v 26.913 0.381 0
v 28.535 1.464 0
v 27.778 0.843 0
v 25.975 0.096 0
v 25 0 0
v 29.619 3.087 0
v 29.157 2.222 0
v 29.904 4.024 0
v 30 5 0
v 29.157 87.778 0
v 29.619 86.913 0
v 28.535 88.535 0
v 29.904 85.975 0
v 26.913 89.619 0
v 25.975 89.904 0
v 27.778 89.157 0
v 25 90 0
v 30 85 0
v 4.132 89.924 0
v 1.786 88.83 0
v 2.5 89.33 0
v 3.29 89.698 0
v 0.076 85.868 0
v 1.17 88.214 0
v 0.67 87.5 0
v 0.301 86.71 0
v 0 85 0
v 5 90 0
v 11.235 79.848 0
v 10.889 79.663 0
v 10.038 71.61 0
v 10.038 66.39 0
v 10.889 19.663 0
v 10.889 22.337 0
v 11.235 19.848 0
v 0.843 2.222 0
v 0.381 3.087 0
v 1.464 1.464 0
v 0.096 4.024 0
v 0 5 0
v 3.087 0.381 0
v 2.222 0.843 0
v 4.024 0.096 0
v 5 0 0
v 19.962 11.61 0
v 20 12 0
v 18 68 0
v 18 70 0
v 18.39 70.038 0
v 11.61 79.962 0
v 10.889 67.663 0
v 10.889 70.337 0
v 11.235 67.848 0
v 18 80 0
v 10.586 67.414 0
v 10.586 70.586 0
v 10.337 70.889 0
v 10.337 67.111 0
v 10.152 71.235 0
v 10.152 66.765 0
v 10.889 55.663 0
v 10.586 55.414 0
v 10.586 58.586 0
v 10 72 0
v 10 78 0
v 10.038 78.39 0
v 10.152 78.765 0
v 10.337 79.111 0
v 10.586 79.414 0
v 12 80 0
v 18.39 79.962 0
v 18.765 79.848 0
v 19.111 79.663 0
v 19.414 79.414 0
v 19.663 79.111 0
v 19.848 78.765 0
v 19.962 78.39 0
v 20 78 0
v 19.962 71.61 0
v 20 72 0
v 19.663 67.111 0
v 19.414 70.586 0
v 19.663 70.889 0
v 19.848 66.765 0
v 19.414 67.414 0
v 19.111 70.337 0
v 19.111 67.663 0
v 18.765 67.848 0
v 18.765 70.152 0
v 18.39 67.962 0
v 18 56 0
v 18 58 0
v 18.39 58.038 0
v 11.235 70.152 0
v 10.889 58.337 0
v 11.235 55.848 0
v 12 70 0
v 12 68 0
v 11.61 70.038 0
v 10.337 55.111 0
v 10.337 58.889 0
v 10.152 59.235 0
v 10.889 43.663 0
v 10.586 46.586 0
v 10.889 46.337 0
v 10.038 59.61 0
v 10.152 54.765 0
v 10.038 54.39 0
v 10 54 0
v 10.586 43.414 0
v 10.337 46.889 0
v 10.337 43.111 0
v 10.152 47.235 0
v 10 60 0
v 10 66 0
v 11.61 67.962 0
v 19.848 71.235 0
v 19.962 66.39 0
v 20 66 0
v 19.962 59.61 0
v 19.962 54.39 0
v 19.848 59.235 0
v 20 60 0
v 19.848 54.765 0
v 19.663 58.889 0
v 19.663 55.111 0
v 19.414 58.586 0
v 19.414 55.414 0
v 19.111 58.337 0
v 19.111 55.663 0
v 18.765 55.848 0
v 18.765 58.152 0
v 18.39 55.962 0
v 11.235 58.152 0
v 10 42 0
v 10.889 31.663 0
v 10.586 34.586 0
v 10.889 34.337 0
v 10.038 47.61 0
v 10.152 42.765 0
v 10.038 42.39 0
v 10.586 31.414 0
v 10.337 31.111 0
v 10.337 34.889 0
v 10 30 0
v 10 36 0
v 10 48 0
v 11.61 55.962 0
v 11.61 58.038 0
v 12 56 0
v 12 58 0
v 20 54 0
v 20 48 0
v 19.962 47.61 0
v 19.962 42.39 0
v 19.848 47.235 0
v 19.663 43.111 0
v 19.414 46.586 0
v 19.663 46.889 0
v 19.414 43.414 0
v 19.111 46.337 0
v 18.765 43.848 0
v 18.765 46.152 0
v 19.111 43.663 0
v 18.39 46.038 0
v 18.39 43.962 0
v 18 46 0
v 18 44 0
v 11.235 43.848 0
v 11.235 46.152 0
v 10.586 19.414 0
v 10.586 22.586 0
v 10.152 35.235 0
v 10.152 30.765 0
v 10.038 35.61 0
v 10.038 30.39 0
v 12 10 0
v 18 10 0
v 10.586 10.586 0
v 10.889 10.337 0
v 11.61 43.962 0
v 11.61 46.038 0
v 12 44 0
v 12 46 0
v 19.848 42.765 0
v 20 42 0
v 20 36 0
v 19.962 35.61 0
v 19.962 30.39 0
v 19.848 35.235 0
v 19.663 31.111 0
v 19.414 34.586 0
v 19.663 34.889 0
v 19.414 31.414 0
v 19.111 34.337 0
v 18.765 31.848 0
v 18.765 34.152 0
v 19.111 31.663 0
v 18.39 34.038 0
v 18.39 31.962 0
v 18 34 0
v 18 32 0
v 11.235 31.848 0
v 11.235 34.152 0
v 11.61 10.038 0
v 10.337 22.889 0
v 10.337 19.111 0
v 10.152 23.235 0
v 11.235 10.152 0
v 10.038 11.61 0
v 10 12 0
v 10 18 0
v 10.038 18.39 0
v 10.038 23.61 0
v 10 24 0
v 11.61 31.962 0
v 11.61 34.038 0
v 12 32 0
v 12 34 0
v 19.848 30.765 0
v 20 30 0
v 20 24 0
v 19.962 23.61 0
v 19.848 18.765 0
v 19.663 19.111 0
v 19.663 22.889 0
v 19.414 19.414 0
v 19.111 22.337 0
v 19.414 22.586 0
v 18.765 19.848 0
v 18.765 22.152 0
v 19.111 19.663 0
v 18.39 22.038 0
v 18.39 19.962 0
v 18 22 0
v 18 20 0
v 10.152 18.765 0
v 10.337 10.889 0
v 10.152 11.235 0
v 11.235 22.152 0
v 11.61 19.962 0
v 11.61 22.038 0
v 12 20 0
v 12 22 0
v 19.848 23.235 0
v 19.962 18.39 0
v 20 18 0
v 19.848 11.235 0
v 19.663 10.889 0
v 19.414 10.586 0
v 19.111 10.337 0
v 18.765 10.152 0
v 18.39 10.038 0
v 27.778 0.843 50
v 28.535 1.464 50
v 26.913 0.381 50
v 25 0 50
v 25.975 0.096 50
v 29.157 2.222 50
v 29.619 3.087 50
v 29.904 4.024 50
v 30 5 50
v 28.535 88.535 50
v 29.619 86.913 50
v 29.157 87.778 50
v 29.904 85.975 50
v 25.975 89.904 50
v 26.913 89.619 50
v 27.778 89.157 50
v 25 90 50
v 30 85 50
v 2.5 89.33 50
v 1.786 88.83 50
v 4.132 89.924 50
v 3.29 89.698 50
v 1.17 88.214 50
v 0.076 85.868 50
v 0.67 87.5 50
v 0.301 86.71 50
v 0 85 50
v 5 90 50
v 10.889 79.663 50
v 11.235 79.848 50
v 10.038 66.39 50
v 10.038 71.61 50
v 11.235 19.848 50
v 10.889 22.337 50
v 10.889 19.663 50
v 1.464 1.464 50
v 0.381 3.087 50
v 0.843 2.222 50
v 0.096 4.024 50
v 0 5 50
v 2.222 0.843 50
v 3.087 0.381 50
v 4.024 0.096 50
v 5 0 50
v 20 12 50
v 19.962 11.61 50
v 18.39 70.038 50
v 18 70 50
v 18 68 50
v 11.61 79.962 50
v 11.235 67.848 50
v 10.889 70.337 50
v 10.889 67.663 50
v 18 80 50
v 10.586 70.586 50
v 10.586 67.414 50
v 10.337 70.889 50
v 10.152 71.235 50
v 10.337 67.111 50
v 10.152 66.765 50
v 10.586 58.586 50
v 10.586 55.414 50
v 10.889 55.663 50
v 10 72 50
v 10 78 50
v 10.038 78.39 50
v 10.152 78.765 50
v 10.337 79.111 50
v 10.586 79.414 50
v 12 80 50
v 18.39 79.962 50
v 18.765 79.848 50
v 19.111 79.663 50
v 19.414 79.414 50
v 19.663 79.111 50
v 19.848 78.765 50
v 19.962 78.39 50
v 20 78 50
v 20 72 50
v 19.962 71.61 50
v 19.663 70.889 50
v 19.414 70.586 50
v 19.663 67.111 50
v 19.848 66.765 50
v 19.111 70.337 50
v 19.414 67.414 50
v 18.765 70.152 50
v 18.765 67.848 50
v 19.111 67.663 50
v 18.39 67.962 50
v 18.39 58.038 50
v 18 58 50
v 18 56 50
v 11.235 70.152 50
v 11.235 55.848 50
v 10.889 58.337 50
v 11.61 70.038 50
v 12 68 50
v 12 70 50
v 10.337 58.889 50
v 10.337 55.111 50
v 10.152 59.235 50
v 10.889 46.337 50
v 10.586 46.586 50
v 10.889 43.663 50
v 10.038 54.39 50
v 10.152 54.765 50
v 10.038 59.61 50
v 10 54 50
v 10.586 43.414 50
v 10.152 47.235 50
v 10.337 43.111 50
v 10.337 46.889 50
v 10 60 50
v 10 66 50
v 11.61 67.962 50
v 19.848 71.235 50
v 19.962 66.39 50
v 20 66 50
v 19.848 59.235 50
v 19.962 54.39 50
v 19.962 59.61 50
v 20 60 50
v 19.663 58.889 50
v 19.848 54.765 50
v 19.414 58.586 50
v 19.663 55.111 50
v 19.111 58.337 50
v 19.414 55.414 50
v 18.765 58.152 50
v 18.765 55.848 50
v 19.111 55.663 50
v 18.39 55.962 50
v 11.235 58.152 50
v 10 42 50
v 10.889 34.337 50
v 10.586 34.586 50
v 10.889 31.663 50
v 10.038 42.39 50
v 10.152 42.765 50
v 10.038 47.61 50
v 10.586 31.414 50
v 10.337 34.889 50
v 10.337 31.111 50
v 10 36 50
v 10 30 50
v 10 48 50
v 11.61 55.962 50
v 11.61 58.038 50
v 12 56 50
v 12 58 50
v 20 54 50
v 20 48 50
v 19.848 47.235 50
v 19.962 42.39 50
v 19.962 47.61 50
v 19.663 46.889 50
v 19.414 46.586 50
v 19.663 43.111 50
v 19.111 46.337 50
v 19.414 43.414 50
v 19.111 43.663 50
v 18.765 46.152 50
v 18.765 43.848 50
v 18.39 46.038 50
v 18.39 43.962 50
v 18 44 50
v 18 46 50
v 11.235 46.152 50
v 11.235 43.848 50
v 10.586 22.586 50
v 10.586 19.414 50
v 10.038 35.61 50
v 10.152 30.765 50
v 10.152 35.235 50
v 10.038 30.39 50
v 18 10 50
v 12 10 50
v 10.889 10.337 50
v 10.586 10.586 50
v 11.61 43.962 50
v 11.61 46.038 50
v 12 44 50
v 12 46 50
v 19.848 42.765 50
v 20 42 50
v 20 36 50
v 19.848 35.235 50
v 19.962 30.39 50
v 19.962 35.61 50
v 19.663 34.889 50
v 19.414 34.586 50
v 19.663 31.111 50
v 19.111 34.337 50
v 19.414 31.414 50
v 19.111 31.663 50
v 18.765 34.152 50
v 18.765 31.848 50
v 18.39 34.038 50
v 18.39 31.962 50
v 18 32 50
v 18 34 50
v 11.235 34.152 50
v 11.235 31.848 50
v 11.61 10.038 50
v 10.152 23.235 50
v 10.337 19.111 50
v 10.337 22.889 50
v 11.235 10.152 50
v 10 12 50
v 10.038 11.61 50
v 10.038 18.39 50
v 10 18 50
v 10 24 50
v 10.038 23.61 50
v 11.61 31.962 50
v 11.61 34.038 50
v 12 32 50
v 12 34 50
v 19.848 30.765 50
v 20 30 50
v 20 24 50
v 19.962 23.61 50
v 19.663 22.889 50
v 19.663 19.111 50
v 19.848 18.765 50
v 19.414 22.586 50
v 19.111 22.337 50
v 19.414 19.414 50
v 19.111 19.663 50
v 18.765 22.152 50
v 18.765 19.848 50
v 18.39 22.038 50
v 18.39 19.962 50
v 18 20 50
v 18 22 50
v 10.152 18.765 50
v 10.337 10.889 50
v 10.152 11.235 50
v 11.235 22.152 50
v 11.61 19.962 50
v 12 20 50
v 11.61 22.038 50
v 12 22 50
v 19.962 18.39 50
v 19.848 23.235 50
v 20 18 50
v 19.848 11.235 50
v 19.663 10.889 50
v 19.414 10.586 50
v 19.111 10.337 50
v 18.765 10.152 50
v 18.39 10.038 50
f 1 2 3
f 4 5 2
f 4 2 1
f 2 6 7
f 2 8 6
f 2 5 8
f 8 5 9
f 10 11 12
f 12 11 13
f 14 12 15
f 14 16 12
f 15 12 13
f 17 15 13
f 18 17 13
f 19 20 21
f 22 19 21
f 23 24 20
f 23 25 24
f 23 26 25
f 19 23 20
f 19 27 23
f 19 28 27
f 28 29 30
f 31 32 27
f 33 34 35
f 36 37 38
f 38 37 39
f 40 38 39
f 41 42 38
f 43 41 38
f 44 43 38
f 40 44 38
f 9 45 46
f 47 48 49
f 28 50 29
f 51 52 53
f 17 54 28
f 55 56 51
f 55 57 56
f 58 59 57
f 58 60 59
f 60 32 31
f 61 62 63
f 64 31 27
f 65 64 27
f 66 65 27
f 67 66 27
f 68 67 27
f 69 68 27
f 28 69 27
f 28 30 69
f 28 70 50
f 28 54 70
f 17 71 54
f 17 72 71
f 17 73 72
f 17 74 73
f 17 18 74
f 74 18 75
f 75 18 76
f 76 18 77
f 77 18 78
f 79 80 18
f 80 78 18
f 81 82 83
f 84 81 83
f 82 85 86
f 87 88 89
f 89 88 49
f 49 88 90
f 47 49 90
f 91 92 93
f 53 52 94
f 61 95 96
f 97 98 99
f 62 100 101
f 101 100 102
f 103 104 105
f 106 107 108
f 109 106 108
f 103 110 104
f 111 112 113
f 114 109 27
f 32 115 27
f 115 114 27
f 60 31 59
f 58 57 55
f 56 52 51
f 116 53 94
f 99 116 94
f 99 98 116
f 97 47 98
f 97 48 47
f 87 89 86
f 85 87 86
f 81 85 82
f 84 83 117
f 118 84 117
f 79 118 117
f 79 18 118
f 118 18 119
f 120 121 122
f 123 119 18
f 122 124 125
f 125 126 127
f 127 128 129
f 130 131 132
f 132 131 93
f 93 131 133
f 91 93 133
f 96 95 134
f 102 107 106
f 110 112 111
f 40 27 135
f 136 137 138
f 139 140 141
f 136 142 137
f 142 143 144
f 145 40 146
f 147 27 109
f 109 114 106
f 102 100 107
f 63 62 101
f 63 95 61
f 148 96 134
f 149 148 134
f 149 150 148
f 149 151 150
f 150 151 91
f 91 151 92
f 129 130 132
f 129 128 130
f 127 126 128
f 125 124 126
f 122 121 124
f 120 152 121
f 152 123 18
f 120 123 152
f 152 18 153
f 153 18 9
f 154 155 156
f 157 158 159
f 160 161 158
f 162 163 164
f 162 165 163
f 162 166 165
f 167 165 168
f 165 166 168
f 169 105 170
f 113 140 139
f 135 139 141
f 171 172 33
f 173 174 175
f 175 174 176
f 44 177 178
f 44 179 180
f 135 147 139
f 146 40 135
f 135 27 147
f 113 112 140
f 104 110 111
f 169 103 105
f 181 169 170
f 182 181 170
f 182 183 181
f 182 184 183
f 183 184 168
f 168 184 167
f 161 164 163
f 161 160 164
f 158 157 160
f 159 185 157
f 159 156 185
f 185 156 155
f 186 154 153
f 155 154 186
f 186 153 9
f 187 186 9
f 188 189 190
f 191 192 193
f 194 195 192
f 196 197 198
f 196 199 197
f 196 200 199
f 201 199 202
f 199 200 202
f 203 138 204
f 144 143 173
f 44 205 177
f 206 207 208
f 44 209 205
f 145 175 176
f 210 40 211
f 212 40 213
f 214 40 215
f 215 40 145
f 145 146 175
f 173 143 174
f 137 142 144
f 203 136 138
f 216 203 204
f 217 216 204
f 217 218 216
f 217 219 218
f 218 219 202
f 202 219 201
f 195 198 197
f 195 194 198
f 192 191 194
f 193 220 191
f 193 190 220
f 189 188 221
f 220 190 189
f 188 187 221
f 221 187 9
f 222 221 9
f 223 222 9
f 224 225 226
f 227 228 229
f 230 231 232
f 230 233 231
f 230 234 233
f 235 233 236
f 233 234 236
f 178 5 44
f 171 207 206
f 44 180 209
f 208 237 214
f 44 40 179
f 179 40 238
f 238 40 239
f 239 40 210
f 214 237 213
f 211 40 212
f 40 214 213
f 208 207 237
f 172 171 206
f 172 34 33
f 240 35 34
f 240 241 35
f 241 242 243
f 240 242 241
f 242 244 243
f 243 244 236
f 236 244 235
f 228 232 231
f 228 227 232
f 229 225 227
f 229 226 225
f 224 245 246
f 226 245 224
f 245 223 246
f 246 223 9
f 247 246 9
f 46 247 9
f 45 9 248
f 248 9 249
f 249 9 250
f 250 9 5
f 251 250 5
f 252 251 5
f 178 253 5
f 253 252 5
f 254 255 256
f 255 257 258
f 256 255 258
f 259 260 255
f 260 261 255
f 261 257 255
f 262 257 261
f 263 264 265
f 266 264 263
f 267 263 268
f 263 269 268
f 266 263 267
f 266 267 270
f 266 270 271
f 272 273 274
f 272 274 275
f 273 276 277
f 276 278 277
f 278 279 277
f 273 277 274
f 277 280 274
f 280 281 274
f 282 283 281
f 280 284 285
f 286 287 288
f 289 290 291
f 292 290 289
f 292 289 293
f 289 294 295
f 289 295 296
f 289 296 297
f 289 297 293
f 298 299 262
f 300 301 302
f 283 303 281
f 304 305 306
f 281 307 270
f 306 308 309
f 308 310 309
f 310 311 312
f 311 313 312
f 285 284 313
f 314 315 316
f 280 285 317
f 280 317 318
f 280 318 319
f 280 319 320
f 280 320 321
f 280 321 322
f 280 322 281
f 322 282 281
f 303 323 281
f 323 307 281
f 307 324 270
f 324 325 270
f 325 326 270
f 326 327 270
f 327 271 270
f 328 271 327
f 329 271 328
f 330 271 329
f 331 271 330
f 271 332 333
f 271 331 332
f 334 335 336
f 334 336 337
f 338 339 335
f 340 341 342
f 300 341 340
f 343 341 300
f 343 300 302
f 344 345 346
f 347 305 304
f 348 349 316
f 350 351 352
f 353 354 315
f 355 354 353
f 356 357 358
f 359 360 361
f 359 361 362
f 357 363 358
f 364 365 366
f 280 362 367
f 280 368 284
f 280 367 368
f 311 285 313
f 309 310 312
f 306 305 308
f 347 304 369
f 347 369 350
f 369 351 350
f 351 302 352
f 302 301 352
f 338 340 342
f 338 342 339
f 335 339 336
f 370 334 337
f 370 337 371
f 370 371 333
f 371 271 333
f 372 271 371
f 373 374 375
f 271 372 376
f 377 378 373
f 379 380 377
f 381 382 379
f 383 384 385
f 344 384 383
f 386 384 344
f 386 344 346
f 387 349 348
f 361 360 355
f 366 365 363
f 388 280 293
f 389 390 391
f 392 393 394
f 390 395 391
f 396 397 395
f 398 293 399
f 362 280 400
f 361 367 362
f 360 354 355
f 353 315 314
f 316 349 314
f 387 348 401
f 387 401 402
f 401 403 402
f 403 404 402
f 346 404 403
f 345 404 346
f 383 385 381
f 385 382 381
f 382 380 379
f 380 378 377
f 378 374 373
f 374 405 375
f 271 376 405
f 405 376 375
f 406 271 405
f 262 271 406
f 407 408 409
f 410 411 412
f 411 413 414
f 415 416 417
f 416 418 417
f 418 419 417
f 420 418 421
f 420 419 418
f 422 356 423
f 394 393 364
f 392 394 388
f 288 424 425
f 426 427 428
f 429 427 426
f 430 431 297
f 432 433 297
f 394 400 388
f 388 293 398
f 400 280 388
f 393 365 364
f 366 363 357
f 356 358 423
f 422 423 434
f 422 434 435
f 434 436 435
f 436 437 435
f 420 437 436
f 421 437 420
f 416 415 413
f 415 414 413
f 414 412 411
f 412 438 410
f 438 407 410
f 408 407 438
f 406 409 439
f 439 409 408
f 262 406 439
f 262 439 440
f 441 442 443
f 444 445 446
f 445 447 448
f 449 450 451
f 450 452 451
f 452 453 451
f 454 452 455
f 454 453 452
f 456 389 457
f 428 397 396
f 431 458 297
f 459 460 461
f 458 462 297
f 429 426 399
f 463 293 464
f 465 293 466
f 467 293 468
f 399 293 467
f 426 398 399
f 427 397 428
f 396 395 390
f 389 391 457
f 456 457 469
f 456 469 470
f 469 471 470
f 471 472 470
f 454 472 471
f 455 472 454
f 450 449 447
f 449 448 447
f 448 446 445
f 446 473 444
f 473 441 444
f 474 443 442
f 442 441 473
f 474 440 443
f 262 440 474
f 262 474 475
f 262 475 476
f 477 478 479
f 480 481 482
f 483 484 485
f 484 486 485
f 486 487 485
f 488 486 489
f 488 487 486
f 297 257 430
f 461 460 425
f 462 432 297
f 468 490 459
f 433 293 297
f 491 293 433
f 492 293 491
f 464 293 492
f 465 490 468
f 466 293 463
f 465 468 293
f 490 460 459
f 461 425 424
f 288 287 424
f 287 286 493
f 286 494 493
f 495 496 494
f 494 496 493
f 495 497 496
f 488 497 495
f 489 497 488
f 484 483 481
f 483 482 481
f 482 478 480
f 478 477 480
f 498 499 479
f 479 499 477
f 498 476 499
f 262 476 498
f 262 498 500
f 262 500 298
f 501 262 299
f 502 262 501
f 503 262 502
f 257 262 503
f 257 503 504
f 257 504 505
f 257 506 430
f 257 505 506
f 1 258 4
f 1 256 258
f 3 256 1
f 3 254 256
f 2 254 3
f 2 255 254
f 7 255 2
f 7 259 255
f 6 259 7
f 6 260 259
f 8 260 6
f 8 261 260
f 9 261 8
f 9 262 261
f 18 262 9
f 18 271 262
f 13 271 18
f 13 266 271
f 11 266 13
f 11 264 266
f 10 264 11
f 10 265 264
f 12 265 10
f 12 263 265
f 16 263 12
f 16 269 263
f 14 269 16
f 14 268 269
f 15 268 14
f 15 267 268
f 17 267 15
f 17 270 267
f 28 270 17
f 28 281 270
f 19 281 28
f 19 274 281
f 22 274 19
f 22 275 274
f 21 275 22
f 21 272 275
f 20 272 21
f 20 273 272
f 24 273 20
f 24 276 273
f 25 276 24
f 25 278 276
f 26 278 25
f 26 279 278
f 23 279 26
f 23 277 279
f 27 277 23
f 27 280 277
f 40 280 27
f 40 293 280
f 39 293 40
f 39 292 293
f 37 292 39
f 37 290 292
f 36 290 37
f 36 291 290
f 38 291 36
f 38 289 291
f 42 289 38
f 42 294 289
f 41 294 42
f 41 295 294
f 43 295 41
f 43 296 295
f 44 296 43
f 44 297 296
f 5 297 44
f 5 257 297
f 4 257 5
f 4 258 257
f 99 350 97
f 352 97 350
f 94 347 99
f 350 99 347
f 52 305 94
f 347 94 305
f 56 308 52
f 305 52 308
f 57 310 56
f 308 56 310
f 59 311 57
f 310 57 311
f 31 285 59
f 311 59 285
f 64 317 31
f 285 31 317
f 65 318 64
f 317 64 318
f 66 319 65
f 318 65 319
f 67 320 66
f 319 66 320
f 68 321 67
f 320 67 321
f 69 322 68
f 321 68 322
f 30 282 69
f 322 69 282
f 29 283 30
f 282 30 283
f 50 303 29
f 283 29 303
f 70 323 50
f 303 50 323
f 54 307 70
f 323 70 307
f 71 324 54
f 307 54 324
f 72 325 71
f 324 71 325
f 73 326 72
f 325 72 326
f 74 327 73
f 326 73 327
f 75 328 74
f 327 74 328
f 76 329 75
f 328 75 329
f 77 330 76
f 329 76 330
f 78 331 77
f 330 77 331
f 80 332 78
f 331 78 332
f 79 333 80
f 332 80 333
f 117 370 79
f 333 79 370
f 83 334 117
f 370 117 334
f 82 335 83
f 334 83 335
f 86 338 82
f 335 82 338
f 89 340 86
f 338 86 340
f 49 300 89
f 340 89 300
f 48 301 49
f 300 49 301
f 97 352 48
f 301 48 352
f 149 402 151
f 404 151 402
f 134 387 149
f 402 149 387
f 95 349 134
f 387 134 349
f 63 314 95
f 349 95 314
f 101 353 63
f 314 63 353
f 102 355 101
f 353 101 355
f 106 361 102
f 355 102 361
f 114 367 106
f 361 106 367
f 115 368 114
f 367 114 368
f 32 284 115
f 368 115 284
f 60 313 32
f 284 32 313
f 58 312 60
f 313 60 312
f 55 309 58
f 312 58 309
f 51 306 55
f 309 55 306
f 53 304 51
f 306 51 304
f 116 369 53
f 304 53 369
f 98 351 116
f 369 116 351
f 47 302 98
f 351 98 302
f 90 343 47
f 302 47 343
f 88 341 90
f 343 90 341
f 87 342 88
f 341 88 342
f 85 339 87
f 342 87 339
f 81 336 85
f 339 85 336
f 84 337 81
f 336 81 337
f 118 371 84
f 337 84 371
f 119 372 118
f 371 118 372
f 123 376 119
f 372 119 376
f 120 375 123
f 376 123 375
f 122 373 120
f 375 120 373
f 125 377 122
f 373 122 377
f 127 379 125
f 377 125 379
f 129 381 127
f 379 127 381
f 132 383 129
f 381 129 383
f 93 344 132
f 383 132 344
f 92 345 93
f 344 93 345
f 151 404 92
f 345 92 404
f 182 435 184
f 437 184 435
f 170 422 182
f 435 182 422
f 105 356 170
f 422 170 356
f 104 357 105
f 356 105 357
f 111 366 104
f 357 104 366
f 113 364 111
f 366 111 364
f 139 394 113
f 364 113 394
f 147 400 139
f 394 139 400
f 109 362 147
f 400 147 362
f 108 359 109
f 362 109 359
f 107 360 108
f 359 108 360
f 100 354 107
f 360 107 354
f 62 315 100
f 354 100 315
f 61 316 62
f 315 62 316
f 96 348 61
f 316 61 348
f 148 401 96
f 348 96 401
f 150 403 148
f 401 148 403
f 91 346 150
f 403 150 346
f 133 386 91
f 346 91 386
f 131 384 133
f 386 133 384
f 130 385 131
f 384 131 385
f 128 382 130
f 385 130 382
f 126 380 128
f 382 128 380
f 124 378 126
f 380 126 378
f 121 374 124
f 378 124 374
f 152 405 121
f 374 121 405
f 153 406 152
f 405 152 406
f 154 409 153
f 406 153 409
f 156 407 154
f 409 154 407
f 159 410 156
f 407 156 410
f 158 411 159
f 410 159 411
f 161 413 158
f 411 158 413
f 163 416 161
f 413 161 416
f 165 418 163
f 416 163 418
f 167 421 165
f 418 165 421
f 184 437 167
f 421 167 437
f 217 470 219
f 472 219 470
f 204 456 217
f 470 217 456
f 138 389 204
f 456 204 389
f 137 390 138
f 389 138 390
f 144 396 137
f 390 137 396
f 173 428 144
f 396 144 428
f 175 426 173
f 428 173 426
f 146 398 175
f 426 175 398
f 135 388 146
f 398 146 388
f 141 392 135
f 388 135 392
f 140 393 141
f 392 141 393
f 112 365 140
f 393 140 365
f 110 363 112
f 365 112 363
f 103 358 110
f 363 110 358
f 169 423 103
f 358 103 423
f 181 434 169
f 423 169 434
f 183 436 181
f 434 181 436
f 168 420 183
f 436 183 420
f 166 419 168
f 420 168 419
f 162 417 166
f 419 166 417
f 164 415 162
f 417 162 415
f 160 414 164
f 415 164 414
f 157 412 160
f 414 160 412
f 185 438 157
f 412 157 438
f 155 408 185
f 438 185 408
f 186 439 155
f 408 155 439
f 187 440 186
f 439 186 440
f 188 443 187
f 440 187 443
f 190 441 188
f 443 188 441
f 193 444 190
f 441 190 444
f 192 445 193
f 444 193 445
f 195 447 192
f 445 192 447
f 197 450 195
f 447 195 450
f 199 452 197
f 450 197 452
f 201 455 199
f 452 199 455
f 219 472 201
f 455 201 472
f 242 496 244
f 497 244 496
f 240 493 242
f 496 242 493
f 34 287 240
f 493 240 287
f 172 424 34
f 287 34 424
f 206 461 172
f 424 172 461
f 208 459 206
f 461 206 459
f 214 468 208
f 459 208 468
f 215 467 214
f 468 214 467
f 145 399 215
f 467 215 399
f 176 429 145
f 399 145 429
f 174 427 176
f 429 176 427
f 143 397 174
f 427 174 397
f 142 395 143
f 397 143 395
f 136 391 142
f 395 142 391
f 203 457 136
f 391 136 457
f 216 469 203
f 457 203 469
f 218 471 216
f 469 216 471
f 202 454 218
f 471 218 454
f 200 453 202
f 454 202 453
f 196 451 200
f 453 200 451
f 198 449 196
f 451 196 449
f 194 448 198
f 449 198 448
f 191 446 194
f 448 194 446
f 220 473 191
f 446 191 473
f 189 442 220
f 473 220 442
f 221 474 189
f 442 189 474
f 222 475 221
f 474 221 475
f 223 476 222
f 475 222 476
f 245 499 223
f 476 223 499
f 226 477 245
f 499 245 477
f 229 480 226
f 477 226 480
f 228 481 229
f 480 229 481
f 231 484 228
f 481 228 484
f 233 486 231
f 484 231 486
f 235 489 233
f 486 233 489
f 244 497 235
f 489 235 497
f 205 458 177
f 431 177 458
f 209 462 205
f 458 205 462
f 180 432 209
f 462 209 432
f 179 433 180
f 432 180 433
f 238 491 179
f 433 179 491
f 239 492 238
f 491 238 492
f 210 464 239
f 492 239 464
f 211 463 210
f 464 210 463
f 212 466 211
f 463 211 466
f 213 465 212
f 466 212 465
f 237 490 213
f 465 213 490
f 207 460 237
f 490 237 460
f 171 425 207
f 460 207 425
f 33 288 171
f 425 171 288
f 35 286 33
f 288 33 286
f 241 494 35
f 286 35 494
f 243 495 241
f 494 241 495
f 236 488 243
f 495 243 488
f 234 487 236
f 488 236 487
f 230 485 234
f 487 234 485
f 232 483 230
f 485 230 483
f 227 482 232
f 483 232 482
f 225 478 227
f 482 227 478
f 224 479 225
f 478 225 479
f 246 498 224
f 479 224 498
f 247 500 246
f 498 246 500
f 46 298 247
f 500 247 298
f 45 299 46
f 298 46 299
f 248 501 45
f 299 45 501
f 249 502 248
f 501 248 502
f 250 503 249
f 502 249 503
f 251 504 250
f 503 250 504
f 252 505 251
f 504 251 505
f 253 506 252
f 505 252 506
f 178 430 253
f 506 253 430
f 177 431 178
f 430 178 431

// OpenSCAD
// Generated by Parametrix
ca_pencil_holder_faceTop_000 = [ [ 5.0000, 0.0000 ],[ 25.0000, 0.0000 ],[ 25.9755, 0.0961 ],[ 26.9134, 0.3806 ],[ 27.7779, 0.8427 ],[ 28.5355, 1.4645 ],[ 29.1573, 2.2221 ],[ 29.6194, 3.0866 ],[ 29.9039, 4.0245 ],[ 30.0000, 5.0000 ],[ 30.0000, 85.0000 ],[ 29.9039, 85.9755 ],[ 29.6194, 86.9134 ],[ 29.1573, 87.7779 ],[ 28.5355, 88.5355 ],[ 27.7779, 89.1573 ],[ 26.9134, 89.6194 ],[ 25.9755, 89.9039 ],[ 25.0000, 90.0000 ],[ 5.0000, 90.0000 ],[ 4.1318, 89.9240 ],[ 3.2899, 89.6985 ],[ 2.5000, 89.3301 ],[ 1.7861, 88.8302 ],[ 1.1698, 88.2139 ],[ 0.6699, 87.5000 ],[ 0.3015, 86.7101 ],[ 0.0760, 85.8682 ],[ 0.0000, 85.0000 ],[ 0.0000, 5.0000 ],[ 0.0961, 4.0245 ],[ 0.3806, 3.0866 ],[ 0.8427, 2.2221 ],[ 1.4645, 1.4645 ],[ 2.2221, 0.8427 ],[ 3.0866, 0.3806 ],[ 4.0245, 0.0961 ],[ 5.0000, 0.0000 ] ];
cb_pencil_holder_faceTop_000 = [  0, 1, 2, 3, 4, 5, 6, 7, 8, 9, 10, 11, 12, 13, 14, 15, 16, 17, 18, 19, 20, 21, 22, 23, 24, 25, 26, 27, 28, 29, 30, 31, 32, 33, 34, 35, 36, 37 ];
ca_pencil_holder_faceTop_001 = [ [ 12.0000, 10.0000 ],[ 18.0000, 10.0000 ],[ 18.3902, 10.0384 ],[ 18.7654, 10.1522 ],[ 19.1111, 10.3371 ],[ 19.4142, 10.5858 ],[ 19.6629, 10.8889 ],[ 19.8478, 11.2346 ],[ 19.9616, 11.6098 ],[ 20.0000, 12.0000 ],[ 20.0000, 18.0000 ],[ 19.9616, 18.3902 ],[ 19.8478, 18.7654 ],[ 19.6629, 19.1111 ],[ 19.4142, 19.4142 ],[ 19.1111, 19.6629 ],[ 18.7654, 19.8478 ],[ 18.3902, 19.9616 ],[ 18.0000, 20.0000 ],[ 12.0000, 20.0000 ],[ 11.6098, 19.9616 ],[ 11.2346, 19.8478 ],[ 10.8889, 19.6629 ],[ 10.5858, 19.4142 ],[ 10.3371, 19.1111 ],[ 10.1522, 18.7654 ],[ 10.0384, 18.3902 ],[ 10.0000, 18.0000 ],[ 10.0000, 12.0000 ],[ 10.0384, 11.6098 ],[ 10.1522, 11.2346 ],[ 10.3371, 10.8889 ],[ 10.5858, 10.5858 ],[ 10.8889, 10.3371 ],[ 11.2346, 10.1522 ],[ 11.6098, 10.0384 ],[ 12.0000, 10.0000 ] ];
cb_pencil_holder_faceTop_001 = [  38, 39, 40, 41, 42, 43, 44, 45, 46, 47, 48, 49, 50, 51, 52, 53, 54, 55, 56, 57, 58, 59, 60, 61, 62, 63, 64, 65, 66, 67, 68, 69, 70, 71, 72, 73, 74 ];
ca_pencil_holder_faceTop_002 = [ [ 12.0000, 22.0000 ],[ 18.0000, 22.0000 ],[ 18.3902, 22.0384 ],[ 18.7654, 22.1522 ],[ 19.1111, 22.3371 ],[ 19.4142, 22.5858 ],[ 19.6629, 22.8889 ],[ 19.8478, 23.2346 ],[ 19.9616, 23.6098 ],[ 20.0000, 24.0000 ],[ 20.0000, 30.0000 ],[ 19.9616, 30.3902 ],[ 19.8478, 30.7654 ],[ 19.6629, 31.1111 ],[ 19.4142, 31.4142 ],[ 19.1111, 31.6629 ],[ 18.7654, 31.8478 ],[ 18.3902, 31.9616 ],[ 18.0000, 32.0000 ],[ 12.0000, 32.0000 ],[ 11.6098, 31.9616 ],[ 11.2346, 31.8478 ],[ 10.8889, 31.6629 ],[ 10.5858, 31.4142 ],[ 10.3371, 31.1111 ],[ 10.1522, 30.7654 ],[ 10.0384, 30.3902 ],[ 10.0000, 30.0000 ],[ 10.0000, 24.0000 ],[ 10.0384, 23.6098 ],[ 10.1522, 23.2346 ],[ 10.3371, 22.8889 ],[ 10.5858, 22.5858 ],[ 10.8889, 22.3371 ],[ 11.2346, 22.1522 ],[ 11.6098, 22.0384 ],[ 12.0000, 22.0000 ] ];
cb_pencil_holder_faceTop_002 = [  75, 76, 77, 78, 79, 80, 81, 82, 83, 84, 85, 86, 87, 88, 89, 90, 91, 92, 93, 94, 95, 96, 97, 98, 99, 100, 101, 102, 103, 104, 105, 106, 107, 108, 109, 110, 111 ];
ca_pencil_holder_faceTop_003 = [ [ 12.0000, 34.0000 ],[ 18.0000, 34.0000 ],[ 18.3902, 34.0384 ],[ 18.7654, 34.1522 ],[ 19.1111, 34.3371 ],[ 19.4142, 34.5858 ],[ 19.6629, 34.8889 ],[ 19.8478, 35.2346 ],[ 19.9616, 35.6098 ],[ 20.0000, 36.0000 ],[ 20.0000, 42.0000 ],[ 19.9616, 42.3902 ],[ 19.8478, 42.7654 ],[ 19.6629, 43.1111 ],[ 19.4142, 43.4142 ],[ 19.1111, 43.6629 ],[ 18.7654, 43.8478 ],[ 18.3902, 43.9616 ],[ 18.0000, 44.0000 ],[ 12.0000, 44.0000 ],[ 11.6098, 43.9616 ],[ 11.2346, 43.8478 ],[ 10.8889, 43.6629 ],[ 10.5858, 43.4142 ],[ 10.3371, 43.1111 ],[ 10.1522, 42.7654 ],[ 10.0384, 42.3902 ],[ 10.0000, 42.0000 ],[ 10.0000, 36.0000 ],[ 10.0384, 35.6098 ],[ 10.1522, 35.2346 ],[ 10.3371, 34.8889 ],[ 10.5858, 34.5858 ],[ 10.8889, 34.3371 ],[ 11.2346, 34.1522 ],[ 11.6098, 34.0384 ],[ 12.0000, 34.0000 ] ];
cb_pencil_holder_faceTop_003 = [  112, 113, 114, 115, 116, 117, 118, 119, 120, 121, 122, 123, 124, 125, 126, 127, 128, 129, 130, 131, 132, 133, 134, 135, 136, 137, 138, 139, 140, 141, 142, 143, 144, 145, 146, 147, 148 ];
ca_pencil_holder_faceTop_004 = [ [ 12.0000, 46.0000 ],[ 18.0000, 46.0000 ],[ 18.3902, 46.0384 ],[ 18.7654, 46.1522 ],[ 19.1111, 46.3371 ],[ 19.4142, 46.5858 ],[ 19.6629, 46.8889 ],[ 19.8478, 47.2346 ],[ 19.9616, 47.6098 ],[ 20.0000, 48.0000 ],[ 20.0000, 54.0000 ],[ 19.9616, 54.3902 ],[ 19.8478, 54.7654 ],[ 19.6629, 55.1111 ],[ 19.4142, 55.4142 ],[ 19.1111, 55.6629 ],[ 18.7654, 55.8478 ],[ 18.3902, 55.9616 ],[ 18.0000, 56.0000 ],[ 12.0000, 56.0000 ],[ 11.6098, 55.9616 ],[ 11.2346, 55.8478 ],[ 10.8889, 55.6629 ],[ 10.5858, 55.4142 ],[ 10.3371, 55.1111 ],[ 10.1522, 54.7654 ],[ 10.0384, 54.3902 ],[ 10.0000, 54.0000 ],[ 10.0000, 48.0000 ],[ 10.0384, 47.6098 ],[ 10.1522, 47.2346 ],[ 10.3371, 46.8889 ],[ 10.5858, 46.5858 ],[ 10.8889, 46.3371 ],[ 11.2346, 46.1522 ],[ 11.6098, 46.0384 ],[ 12.0000, 46.0000 ] ];
cb_pencil_holder_faceTop_004 = [  149, 150, 151, 152, 153, 154, 155, 156, 157, 158, 159, 160, 161, 162, 163, 164, 165, 166, 167, 168, 169, 170, 171, 172, 173, 174, 175, 176, 177, 178, 179, 180, 181, 182, 183, 184, 185 ];
ca_pencil_holder_faceTop_005 = [ [ 12.0000, 58.0000 ],[ 18.0000, 58.0000 ],[ 18.3902, 58.0384 ],[ 18.7654, 58.1522 ],[ 19.1111, 58.3371 ],[ 19.4142, 58.5858 ],[ 19.6629, 58.8889 ],[ 19.8478, 59.2346 ],[ 19.9616, 59.6098 ],[ 20.0000, 60.0000 ],[ 20.0000, 66.0000 ],[ 19.9616, 66.3902 ],[ 19.8478, 66.7654 ],[ 19.6629, 67.1111 ],[ 19.4142, 67.4142 ],[ 19.1111, 67.6629 ],[ 18.7654, 67.8478 ],[ 18.3902, 67.9616 ],[ 18.0000, 68.0000 ],[ 12.0000, 68.0000 ],[ 11.6098, 67.9616 ],[ 11.2346, 67.8478 ],[ 10.8889, 67.6629 ],[ 10.5858, 67.4142 ],[ 10.3371, 67.1111 ],[ 10.1522, 66.7654 ],[ 10.0384, 66.3902 ],[ 10.0000, 66.0000 ],[ 10.0000, 60.0000 ],[ 10.0384, 59.6098 ],[ 10.1522, 59.2346 ],[ 10.3371, 58.8889 ],[ 10.5858, 58.5858 ],[ 10.8889, 58.3371 ],[ 11.2346, 58.1522 ],[ 11.6098, 58.0384 ],[ 12.0000, 58.0000 ] ];
cb_pencil_holder_faceTop_005 = [  186, 187, 188, 189, 190, 191, 192, 193, 194, 195, 196, 197, 198, 199, 200, 201, 202, 203, 204, 205, 206, 207, 208, 209, 210, 211, 212, 213, 214, 215, 216, 217, 218, 219, 220, 221, 222 ];
ca_pencil_holder_faceTop_006 = [ [ 12.0000, 70.0000 ],[ 18.0000, 70.0000 ],[ 18.3902, 70.0384 ],[ 18.7654, 70.1522 ],[ 19.1111, 70.3371 ],[ 19.4142, 70.5858 ],[ 19.6629, 70.8889 ],[ 19.8478, 71.2346 ],[ 19.9616, 71.6098 ],[ 20.0000, 72.0000 ],[ 20.0000, 78.0000 ],[ 19.9616, 78.3902 ],[ 19.8478, 78.7654 ],[ 19.6629, 79.1111 ],[ 19.4142, 79.4142 ],[ 19.1111, 79.6629 ],[ 18.7654, 79.8478 ],[ 18.3902, 79.9616 ],[ 18.0000, 80.0000 ],[ 12.0000, 80.0000 ],[ 11.6098, 79.9616 ],[ 11.2346, 79.8478 ],[ 10.8889, 79.6629 ],[ 10.5858, 79.4142 ],[ 10.3371, 79.1111 ],[ 10.1522, 78.7654 ],[ 10.0384, 78.3902 ],[ 10.0000, 78.0000 ],[ 10.0000, 72.0000 ],[ 10.0384, 71.6098 ],[ 10.1522, 71.2346 ],[ 10.3371, 70.8889 ],[ 10.5858, 70.5858 ],[ 10.8889, 70.3371 ],[ 11.2346, 70.1522 ],[ 11.6098, 70.0384 ],[ 12.0000, 70.0000 ] ];
cb_pencil_holder_faceTop_006 = [  223, 224, 225, 226, 227, 228, 229, 230, 231, 232, 233, 234, 235, 236, 237, 238, 239, 240, 241, 242, 243, 244, 245, 246, 247, 248, 249, 250, 251, 252, 253, 254, 255, 256, 257, 258, 259 ];
a_pencil_holder_faceTop = concat(ca_pencil_holder_faceTop_000, ca_pencil_holder_faceTop_001, ca_pencil_holder_faceTop_002, ca_pencil_holder_faceTop_003, ca_pencil_holder_faceTop_004, ca_pencil_holder_faceTop_005, ca_pencil_holder_faceTop_006);
b_pencil_holder_faceTop = [cb_pencil_holder_faceTop_000, cb_pencil_holder_faceTop_001, cb_pencil_holder_faceTop_002, cb_pencil_holder_faceTop_003, cb_pencil_holder_faceTop_004, cb_pencil_holder_faceTop_005, cb_pencil_holder_faceTop_006];
ca_pencil_holder_faceFace_000 = [ [ 0.0000, 0.0000 ],[ 30.0000, 0.0000 ],[ 30.0000, 50.0000 ],[ 0.0000, 50.0000 ],[ 0.0000, 0.0000 ] ];
cb_pencil_holder_faceFace_000 = [  0, 1, 2, 3, 4 ];
a_pencil_holder_faceFace = concat(ca_pencil_holder_faceFace_000);
b_pencil_holder_faceFace = [cb_pencil_holder_faceFace_000];
ca_pencil_holder_faceSide_000 = [ [ 0.0000, 0.0000 ],[ 90.0000, 0.0000 ],[ 90.0000, 50.0000 ],[ 0.0000, 50.0000 ],[ 0.0000, 0.0000 ] ];
cb_pencil_holder_faceSide_000 = [  0, 1, 2, 3, 4 ];
a_pencil_holder_faceSide = concat(ca_pencil_holder_faceSide_000);
b_pencil_holder_faceSide = [cb_pencil_holder_faceSide_000];

module subpax_pencil_holder () {
	translate( [ 0, 0, 0 ])
		rotate( [ 0, 0, 0 ])
			   linear_extrude(height = 50) polygon(a_pencil_holder_faceTop, b_pencil_holder_faceTop);
}

module pax_pencil_holder () {
	subpax_pencil_holder();
}

pax_pencil_holder();
